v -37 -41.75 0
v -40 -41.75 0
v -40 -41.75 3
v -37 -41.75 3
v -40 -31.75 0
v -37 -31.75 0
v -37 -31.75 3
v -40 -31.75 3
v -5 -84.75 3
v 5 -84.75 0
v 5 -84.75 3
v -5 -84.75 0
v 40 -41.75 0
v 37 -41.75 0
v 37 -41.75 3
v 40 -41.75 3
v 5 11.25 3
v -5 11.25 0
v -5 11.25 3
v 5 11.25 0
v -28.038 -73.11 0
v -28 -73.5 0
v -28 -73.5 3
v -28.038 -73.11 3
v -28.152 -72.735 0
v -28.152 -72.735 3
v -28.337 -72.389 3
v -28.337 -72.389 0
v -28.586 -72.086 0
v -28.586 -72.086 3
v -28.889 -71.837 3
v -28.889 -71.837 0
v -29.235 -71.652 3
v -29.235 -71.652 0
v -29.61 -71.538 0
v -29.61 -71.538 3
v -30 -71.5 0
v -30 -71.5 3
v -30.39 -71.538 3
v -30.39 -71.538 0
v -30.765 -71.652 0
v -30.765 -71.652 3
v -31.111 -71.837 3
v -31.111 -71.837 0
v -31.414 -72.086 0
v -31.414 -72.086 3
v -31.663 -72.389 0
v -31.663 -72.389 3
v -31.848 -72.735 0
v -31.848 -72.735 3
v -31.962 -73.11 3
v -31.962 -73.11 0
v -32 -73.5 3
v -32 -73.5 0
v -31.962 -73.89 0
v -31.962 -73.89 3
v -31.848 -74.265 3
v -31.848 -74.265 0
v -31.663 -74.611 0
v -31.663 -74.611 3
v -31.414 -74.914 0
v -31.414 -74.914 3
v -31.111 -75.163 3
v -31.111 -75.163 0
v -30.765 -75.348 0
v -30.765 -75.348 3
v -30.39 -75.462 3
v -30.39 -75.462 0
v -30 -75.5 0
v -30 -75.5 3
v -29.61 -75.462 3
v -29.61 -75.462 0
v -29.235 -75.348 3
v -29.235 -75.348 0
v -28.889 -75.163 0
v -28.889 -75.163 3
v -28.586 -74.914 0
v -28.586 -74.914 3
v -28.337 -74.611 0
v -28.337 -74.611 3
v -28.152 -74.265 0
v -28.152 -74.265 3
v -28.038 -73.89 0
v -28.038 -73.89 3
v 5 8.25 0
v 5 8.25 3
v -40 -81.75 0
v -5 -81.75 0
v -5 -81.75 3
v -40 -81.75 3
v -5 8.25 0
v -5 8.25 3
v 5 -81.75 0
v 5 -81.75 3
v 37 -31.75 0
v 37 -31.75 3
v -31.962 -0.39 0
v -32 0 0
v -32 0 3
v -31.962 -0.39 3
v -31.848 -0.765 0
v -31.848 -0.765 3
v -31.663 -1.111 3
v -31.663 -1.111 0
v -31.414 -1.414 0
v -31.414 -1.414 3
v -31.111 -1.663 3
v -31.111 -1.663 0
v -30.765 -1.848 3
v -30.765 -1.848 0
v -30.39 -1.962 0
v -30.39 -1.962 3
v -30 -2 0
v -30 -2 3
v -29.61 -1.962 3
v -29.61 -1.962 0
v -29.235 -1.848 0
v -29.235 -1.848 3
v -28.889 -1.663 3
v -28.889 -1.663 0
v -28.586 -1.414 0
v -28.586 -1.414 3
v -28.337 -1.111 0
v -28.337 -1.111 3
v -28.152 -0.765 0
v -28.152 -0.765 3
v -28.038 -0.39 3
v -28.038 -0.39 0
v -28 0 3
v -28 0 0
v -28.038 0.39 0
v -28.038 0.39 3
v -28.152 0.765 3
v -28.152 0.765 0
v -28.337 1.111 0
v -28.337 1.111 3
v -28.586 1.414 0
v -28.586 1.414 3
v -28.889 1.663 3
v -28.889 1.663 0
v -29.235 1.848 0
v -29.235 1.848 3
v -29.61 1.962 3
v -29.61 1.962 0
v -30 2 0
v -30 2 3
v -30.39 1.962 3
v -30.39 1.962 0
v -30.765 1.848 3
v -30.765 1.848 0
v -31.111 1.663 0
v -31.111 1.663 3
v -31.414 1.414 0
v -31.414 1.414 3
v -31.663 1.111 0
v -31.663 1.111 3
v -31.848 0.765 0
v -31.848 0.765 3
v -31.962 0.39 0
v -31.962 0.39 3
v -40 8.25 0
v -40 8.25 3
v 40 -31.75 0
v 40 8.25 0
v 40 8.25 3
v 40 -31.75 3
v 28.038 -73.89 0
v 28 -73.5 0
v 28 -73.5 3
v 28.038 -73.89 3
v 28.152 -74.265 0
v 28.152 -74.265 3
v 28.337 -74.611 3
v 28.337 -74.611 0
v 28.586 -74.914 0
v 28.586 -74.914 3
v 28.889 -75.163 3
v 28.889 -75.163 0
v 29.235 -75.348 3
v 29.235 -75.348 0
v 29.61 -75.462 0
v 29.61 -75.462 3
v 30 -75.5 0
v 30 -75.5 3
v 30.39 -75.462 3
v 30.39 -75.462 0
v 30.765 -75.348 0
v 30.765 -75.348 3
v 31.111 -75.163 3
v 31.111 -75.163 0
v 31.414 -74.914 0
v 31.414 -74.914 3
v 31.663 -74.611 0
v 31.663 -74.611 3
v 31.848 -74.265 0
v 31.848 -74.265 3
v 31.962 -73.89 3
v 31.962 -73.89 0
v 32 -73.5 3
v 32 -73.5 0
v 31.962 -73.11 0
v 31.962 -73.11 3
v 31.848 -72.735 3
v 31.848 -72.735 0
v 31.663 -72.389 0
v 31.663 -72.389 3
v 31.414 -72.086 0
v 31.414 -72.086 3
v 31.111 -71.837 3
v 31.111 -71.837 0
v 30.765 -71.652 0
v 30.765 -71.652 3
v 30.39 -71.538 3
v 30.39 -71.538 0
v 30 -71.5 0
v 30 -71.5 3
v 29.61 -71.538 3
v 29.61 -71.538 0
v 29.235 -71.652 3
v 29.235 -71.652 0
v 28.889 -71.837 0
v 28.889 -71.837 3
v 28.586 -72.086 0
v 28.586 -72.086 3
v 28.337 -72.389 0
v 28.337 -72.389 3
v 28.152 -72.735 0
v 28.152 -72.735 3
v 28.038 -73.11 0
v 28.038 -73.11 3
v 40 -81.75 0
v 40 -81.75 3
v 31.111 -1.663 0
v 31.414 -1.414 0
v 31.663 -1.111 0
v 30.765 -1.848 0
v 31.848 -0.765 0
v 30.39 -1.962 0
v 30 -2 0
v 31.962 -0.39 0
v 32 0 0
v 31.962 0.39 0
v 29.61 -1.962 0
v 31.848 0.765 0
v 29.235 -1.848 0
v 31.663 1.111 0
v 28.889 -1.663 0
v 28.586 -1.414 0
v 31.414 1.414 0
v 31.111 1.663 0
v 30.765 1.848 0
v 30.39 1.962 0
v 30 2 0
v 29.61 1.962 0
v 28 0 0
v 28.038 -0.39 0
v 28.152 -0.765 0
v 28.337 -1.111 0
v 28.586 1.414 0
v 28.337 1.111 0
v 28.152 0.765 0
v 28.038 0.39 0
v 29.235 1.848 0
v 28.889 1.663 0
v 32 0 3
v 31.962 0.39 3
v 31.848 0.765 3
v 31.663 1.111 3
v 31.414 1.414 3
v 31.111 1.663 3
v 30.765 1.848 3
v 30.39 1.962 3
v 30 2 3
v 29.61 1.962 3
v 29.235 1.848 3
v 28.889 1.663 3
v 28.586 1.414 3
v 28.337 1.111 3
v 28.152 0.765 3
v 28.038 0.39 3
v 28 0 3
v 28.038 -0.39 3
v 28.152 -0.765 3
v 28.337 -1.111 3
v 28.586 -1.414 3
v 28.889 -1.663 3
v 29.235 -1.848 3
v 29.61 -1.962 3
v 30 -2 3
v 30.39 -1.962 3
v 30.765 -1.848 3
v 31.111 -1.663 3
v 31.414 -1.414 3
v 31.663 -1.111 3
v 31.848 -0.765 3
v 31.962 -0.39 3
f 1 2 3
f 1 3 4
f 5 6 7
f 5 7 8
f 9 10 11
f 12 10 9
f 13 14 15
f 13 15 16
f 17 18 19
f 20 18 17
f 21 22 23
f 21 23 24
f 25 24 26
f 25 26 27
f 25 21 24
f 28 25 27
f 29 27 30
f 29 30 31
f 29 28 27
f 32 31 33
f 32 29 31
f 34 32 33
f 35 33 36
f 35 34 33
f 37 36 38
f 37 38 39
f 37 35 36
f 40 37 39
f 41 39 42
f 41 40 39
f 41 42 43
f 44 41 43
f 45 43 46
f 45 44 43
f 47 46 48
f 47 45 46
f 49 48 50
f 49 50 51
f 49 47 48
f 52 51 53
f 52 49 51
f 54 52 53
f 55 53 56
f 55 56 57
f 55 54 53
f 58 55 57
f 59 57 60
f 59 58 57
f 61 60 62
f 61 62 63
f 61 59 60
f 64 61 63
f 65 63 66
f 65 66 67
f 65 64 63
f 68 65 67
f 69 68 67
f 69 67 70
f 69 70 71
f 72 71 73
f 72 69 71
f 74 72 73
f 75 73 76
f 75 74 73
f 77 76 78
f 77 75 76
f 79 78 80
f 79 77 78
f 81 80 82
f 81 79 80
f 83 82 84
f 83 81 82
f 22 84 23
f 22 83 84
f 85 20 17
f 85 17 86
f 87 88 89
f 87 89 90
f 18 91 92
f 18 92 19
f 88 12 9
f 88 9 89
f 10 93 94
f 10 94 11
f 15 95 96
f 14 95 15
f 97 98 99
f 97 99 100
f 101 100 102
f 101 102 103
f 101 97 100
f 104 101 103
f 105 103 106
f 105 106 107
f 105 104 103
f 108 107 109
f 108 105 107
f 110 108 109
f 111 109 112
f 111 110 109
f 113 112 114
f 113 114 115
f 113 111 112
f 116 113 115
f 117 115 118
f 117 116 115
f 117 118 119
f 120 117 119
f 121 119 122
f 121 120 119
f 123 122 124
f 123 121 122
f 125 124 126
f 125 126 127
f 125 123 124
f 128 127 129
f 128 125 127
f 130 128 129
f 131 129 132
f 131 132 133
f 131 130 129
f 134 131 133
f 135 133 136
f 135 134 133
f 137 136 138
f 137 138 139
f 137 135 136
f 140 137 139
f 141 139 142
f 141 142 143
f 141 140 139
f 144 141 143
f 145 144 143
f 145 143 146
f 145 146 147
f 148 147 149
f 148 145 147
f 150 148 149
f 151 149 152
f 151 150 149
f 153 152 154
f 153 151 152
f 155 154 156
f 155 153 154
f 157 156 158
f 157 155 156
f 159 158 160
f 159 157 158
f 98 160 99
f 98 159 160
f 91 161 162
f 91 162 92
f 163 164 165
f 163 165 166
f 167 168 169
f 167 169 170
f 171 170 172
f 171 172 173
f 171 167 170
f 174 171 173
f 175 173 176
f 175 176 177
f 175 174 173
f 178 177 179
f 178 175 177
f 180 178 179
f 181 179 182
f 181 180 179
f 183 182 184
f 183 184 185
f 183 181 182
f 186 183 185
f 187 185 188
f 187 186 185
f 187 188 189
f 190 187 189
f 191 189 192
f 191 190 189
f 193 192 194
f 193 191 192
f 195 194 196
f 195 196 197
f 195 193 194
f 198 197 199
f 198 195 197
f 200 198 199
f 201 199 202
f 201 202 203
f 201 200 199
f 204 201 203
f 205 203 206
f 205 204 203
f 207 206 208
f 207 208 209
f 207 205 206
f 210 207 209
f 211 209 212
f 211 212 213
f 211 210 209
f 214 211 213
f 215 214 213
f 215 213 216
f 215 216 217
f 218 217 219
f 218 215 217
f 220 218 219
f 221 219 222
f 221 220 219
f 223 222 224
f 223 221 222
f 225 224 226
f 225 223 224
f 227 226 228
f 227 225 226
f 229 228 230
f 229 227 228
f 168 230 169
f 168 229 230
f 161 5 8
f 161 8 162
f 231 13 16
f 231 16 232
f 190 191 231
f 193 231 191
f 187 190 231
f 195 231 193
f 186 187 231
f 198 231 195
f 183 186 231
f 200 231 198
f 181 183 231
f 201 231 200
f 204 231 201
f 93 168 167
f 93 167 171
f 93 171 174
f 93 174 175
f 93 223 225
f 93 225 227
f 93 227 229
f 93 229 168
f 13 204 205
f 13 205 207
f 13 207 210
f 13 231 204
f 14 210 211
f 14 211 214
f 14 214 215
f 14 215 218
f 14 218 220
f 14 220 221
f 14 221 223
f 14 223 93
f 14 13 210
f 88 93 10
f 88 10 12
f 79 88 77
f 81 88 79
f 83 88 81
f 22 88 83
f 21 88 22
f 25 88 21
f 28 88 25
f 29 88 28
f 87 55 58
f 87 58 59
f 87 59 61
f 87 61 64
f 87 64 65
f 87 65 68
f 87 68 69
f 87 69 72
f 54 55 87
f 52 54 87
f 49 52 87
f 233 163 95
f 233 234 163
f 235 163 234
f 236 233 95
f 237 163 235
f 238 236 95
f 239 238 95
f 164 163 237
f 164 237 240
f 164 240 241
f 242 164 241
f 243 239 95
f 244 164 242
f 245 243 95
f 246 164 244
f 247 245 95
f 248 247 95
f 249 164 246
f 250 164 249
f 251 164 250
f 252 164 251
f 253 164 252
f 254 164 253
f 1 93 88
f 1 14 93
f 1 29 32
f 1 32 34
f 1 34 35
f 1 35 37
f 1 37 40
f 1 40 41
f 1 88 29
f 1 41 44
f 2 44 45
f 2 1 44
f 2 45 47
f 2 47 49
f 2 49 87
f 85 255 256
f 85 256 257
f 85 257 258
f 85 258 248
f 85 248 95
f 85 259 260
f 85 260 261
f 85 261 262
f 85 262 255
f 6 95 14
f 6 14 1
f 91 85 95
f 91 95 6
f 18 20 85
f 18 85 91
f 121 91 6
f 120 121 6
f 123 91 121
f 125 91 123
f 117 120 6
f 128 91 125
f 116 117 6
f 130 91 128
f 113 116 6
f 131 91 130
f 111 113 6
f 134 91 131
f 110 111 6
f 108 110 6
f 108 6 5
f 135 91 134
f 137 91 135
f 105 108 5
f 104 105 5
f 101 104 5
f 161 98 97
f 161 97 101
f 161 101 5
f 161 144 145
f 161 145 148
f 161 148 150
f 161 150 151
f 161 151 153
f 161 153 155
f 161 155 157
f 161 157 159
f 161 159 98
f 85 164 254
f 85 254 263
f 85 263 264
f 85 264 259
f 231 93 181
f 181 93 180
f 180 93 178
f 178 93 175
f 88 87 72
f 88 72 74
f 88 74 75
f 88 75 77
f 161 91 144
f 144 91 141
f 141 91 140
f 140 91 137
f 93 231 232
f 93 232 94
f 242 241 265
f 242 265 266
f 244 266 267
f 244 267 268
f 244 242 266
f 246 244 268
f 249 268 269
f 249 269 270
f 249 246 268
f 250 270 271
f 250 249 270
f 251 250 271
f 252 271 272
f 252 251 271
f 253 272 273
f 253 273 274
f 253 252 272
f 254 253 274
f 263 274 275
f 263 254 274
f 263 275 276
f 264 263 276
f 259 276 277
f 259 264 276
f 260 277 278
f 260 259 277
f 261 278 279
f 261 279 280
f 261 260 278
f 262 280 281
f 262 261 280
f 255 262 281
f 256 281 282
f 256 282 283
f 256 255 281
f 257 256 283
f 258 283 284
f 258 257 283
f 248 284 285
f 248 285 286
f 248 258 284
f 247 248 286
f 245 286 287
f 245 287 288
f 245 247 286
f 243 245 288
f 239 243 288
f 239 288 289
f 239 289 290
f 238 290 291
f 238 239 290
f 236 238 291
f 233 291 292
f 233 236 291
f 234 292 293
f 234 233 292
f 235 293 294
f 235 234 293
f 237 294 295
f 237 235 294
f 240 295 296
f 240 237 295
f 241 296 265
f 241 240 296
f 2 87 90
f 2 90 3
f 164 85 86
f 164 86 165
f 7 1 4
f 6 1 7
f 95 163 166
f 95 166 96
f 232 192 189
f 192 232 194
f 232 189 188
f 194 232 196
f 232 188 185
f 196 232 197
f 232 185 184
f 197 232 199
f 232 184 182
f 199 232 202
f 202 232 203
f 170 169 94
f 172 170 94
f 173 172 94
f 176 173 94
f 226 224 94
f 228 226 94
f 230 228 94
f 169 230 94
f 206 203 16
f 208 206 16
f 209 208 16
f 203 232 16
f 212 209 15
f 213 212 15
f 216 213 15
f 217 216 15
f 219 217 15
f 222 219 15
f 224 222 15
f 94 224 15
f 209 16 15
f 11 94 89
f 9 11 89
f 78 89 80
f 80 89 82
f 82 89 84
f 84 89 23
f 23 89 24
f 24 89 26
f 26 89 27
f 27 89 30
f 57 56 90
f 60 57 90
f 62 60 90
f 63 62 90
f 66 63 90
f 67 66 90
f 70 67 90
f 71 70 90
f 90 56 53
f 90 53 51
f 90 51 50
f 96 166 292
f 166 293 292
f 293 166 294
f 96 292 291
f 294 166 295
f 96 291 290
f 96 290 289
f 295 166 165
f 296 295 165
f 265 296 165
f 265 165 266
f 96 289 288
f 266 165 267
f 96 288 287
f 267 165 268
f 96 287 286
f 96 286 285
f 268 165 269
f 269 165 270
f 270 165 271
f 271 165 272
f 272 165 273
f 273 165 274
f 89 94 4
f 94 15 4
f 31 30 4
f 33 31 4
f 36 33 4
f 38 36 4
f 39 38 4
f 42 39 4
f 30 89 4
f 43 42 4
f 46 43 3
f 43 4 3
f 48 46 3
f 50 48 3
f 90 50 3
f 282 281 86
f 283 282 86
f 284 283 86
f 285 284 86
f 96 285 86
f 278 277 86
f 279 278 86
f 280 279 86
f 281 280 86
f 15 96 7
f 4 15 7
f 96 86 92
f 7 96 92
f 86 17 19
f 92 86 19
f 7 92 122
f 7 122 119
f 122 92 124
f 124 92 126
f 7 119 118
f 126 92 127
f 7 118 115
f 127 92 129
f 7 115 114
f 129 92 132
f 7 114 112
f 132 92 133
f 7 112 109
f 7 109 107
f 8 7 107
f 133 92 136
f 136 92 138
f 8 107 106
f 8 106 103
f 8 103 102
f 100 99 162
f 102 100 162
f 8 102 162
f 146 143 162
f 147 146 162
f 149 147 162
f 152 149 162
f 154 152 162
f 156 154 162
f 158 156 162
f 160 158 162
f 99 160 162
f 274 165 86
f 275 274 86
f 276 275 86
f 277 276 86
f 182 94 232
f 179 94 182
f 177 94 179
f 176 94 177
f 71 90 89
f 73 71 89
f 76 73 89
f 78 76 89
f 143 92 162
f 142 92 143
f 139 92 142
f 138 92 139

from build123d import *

# Parameters (mm, degrees)
SKETCH1_R           = 2
BOSS_EXTRUDE1_DEPTH = 3


with BuildPart() as part:
    # Sketch1 → Boss-Extrude1 (new body)
    with BuildSketch(Plane.XY):
        Polygon((5, 8.25), (40, 8.25), (40, -31.75), (37, -31.75), (37, -41.75), (40, -41.75), (40, -81.75), (5, -81.75), (5, -84.75), (-5, -84.75), (-5, -81.75), (-40, -81.75), (-40, -41.75), (-37, -41.75), (-37, -31.75), (-40, -31.75), (-40, 8.25), (-5, 8.25), (-5, 11.25), (5, 11.25), align=None)
        with Locations((30, 0)):
            Circle(SKETCH1_R, mode=Mode.SUBTRACT)
        with Locations(Location((30, -73.5, 0), (0, 0, 180))):
            Circle(SKETCH1_R, mode=Mode.SUBTRACT)
        with Locations((-30, -73.5)):
            Circle(SKETCH1_R, mode=Mode.SUBTRACT)
        with Locations(Location((-30, 0, 0), (0, 0, 180))):
            Circle(SKETCH1_R, mode=Mode.SUBTRACT)
    extrude(amount=BOSS_EXTRUDE1_DEPTH)


solid = part.part
